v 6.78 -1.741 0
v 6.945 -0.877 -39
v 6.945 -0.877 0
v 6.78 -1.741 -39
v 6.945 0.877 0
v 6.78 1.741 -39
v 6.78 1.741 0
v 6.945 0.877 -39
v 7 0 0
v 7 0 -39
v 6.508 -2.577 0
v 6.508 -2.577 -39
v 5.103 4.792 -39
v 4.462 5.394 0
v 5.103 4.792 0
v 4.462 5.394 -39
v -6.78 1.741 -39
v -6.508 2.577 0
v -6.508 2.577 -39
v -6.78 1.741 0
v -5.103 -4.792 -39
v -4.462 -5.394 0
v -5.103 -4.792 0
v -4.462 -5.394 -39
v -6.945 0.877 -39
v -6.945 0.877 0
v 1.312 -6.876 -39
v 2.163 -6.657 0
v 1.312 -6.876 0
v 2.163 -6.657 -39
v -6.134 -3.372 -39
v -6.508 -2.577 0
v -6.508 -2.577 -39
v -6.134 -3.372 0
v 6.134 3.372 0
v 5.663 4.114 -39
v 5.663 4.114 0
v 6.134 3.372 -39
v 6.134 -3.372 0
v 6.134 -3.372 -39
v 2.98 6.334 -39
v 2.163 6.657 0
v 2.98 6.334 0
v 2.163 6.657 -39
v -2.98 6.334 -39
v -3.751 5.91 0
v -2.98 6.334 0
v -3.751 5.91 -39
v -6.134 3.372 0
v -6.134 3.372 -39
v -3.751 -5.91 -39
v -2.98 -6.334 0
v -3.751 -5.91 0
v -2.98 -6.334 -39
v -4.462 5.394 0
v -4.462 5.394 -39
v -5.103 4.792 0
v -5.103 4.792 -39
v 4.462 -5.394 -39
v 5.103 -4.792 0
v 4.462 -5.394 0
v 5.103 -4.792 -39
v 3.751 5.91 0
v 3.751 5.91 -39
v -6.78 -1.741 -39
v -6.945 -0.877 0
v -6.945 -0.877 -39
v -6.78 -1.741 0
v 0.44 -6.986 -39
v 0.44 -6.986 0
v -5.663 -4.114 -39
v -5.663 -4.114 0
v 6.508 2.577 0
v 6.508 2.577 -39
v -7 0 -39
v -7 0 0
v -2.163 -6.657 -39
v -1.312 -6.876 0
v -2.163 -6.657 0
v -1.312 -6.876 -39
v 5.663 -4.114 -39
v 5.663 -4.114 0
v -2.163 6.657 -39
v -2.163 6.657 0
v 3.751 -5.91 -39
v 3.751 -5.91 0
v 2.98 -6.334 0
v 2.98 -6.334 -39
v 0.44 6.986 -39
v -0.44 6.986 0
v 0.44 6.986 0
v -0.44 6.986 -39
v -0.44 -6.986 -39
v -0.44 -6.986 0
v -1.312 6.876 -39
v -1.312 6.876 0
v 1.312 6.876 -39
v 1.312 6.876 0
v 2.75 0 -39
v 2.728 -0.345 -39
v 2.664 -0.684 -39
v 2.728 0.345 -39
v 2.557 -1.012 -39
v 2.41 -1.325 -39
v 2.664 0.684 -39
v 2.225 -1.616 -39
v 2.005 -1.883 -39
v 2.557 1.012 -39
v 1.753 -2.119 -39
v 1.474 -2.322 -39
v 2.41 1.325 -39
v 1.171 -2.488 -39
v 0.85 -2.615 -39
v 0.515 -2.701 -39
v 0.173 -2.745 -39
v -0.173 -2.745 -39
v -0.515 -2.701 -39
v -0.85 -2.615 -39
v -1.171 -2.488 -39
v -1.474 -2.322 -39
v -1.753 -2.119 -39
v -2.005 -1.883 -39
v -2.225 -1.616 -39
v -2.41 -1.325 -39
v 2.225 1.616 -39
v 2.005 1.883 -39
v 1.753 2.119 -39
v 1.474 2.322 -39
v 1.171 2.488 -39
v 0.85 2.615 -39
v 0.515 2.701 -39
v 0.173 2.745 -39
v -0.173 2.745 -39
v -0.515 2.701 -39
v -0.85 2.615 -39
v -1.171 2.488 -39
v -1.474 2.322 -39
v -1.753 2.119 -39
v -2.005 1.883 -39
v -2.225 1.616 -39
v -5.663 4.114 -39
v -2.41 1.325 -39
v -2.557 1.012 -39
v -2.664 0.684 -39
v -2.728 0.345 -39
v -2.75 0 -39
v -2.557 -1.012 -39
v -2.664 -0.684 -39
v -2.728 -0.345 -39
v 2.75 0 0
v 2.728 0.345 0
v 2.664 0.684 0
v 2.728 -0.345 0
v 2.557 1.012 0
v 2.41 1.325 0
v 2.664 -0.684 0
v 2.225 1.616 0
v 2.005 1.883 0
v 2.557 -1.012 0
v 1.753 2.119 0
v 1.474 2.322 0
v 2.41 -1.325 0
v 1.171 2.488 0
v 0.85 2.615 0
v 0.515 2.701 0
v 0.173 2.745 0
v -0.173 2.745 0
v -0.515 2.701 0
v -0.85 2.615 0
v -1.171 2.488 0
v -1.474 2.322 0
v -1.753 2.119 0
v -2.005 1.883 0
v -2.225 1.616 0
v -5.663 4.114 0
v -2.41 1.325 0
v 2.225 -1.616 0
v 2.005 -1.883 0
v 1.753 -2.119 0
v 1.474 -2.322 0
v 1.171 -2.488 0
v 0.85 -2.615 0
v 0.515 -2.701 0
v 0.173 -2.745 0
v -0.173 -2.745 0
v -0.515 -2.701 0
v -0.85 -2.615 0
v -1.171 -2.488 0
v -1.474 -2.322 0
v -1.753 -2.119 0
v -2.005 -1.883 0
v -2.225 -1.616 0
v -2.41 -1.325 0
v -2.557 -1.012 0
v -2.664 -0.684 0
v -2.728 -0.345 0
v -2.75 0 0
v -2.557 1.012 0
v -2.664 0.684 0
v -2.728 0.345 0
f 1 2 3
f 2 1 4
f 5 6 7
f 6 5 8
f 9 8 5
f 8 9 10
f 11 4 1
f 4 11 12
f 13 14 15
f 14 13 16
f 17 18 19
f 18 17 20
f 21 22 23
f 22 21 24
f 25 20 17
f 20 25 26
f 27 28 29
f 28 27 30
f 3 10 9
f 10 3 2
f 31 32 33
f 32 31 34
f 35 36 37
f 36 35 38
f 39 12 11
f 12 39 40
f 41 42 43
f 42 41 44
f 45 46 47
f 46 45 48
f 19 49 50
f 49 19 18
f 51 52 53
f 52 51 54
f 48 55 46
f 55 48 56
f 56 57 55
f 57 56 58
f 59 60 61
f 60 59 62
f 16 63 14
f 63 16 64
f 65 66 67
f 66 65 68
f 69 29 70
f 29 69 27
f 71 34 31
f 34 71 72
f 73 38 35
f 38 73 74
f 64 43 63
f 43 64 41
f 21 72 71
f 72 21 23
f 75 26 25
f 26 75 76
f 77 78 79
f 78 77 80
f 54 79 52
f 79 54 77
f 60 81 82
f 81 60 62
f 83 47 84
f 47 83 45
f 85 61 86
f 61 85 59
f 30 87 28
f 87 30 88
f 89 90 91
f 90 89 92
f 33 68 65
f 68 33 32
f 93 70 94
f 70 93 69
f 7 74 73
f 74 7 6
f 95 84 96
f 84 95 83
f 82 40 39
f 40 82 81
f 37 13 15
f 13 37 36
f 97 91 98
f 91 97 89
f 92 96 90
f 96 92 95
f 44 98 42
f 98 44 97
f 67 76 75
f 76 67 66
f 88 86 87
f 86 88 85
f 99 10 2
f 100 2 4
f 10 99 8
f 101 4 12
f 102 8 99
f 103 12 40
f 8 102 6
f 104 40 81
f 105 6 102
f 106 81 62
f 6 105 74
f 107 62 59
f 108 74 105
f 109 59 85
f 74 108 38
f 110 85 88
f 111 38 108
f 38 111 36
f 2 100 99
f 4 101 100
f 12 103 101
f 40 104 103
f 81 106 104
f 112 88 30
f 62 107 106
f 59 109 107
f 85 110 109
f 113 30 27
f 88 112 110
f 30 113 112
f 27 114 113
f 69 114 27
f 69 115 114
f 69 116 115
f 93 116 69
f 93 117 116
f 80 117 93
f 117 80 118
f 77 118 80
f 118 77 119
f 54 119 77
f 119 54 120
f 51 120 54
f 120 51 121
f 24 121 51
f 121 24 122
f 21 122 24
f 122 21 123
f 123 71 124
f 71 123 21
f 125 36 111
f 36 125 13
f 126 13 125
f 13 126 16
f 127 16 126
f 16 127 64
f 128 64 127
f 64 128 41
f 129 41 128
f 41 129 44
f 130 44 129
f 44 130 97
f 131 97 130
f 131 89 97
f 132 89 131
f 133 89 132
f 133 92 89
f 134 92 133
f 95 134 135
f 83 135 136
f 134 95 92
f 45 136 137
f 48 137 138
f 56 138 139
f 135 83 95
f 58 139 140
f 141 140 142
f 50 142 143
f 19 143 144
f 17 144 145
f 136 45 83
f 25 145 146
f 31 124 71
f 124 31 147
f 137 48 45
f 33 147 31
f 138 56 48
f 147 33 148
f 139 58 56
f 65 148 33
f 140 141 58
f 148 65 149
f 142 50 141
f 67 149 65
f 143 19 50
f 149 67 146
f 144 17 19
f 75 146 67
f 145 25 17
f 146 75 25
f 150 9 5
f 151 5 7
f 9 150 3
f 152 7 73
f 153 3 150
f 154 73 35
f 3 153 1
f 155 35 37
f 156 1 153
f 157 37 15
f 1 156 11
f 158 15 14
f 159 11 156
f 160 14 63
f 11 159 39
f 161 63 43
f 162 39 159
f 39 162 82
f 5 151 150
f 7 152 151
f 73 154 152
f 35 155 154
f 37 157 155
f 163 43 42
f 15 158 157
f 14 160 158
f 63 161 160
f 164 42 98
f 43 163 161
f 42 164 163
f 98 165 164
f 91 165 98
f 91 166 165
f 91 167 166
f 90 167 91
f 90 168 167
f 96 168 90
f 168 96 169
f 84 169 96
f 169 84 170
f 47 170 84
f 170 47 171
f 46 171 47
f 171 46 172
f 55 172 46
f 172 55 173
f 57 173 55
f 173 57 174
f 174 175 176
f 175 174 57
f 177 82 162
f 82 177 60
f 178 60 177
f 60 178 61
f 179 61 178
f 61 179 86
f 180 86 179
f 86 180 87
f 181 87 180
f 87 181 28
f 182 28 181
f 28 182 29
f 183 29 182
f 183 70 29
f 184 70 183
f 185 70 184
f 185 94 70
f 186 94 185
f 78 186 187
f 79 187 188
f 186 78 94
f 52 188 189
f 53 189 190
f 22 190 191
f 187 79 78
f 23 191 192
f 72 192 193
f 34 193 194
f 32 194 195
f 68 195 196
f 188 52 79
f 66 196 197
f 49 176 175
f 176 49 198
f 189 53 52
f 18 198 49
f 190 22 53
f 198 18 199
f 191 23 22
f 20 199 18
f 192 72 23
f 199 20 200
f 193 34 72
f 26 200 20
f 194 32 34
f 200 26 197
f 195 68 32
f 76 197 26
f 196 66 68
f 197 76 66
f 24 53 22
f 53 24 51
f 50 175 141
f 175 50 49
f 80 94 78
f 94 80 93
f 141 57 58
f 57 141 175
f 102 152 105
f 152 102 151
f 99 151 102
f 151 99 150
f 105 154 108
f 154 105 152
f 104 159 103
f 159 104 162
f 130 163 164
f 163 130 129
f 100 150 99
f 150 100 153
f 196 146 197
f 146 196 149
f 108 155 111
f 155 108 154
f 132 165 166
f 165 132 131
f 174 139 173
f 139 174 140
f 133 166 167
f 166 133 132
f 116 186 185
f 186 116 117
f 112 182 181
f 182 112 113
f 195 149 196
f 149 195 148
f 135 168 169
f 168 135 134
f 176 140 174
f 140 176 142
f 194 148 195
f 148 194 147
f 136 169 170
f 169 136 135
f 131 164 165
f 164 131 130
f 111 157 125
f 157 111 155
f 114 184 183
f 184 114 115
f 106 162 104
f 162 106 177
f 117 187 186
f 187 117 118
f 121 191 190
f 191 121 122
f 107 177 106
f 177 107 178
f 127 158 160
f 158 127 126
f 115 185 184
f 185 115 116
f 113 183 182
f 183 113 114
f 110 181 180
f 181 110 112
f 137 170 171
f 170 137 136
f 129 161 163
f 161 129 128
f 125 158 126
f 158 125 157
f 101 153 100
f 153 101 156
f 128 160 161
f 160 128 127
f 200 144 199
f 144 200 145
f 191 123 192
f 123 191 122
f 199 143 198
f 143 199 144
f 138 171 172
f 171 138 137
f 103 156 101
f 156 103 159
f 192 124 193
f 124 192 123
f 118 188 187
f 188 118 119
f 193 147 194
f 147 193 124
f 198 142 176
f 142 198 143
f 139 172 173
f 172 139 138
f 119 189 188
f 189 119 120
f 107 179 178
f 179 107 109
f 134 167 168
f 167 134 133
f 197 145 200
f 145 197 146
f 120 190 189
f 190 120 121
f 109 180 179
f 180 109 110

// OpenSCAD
$fn = 50;


difference() {
	union() {
		translate(v = [0, 0, -39.0000000000]) {
			cylinder(h = 39, r = 7.0000000000);
		}
		cylinder(h = 0, r = 16.0000000000);
	}
	union() {
		#translate(v = [0, 0, -39]) {
			cylinder(h = 39, r = 2.7500000000);
		}
	}
}
